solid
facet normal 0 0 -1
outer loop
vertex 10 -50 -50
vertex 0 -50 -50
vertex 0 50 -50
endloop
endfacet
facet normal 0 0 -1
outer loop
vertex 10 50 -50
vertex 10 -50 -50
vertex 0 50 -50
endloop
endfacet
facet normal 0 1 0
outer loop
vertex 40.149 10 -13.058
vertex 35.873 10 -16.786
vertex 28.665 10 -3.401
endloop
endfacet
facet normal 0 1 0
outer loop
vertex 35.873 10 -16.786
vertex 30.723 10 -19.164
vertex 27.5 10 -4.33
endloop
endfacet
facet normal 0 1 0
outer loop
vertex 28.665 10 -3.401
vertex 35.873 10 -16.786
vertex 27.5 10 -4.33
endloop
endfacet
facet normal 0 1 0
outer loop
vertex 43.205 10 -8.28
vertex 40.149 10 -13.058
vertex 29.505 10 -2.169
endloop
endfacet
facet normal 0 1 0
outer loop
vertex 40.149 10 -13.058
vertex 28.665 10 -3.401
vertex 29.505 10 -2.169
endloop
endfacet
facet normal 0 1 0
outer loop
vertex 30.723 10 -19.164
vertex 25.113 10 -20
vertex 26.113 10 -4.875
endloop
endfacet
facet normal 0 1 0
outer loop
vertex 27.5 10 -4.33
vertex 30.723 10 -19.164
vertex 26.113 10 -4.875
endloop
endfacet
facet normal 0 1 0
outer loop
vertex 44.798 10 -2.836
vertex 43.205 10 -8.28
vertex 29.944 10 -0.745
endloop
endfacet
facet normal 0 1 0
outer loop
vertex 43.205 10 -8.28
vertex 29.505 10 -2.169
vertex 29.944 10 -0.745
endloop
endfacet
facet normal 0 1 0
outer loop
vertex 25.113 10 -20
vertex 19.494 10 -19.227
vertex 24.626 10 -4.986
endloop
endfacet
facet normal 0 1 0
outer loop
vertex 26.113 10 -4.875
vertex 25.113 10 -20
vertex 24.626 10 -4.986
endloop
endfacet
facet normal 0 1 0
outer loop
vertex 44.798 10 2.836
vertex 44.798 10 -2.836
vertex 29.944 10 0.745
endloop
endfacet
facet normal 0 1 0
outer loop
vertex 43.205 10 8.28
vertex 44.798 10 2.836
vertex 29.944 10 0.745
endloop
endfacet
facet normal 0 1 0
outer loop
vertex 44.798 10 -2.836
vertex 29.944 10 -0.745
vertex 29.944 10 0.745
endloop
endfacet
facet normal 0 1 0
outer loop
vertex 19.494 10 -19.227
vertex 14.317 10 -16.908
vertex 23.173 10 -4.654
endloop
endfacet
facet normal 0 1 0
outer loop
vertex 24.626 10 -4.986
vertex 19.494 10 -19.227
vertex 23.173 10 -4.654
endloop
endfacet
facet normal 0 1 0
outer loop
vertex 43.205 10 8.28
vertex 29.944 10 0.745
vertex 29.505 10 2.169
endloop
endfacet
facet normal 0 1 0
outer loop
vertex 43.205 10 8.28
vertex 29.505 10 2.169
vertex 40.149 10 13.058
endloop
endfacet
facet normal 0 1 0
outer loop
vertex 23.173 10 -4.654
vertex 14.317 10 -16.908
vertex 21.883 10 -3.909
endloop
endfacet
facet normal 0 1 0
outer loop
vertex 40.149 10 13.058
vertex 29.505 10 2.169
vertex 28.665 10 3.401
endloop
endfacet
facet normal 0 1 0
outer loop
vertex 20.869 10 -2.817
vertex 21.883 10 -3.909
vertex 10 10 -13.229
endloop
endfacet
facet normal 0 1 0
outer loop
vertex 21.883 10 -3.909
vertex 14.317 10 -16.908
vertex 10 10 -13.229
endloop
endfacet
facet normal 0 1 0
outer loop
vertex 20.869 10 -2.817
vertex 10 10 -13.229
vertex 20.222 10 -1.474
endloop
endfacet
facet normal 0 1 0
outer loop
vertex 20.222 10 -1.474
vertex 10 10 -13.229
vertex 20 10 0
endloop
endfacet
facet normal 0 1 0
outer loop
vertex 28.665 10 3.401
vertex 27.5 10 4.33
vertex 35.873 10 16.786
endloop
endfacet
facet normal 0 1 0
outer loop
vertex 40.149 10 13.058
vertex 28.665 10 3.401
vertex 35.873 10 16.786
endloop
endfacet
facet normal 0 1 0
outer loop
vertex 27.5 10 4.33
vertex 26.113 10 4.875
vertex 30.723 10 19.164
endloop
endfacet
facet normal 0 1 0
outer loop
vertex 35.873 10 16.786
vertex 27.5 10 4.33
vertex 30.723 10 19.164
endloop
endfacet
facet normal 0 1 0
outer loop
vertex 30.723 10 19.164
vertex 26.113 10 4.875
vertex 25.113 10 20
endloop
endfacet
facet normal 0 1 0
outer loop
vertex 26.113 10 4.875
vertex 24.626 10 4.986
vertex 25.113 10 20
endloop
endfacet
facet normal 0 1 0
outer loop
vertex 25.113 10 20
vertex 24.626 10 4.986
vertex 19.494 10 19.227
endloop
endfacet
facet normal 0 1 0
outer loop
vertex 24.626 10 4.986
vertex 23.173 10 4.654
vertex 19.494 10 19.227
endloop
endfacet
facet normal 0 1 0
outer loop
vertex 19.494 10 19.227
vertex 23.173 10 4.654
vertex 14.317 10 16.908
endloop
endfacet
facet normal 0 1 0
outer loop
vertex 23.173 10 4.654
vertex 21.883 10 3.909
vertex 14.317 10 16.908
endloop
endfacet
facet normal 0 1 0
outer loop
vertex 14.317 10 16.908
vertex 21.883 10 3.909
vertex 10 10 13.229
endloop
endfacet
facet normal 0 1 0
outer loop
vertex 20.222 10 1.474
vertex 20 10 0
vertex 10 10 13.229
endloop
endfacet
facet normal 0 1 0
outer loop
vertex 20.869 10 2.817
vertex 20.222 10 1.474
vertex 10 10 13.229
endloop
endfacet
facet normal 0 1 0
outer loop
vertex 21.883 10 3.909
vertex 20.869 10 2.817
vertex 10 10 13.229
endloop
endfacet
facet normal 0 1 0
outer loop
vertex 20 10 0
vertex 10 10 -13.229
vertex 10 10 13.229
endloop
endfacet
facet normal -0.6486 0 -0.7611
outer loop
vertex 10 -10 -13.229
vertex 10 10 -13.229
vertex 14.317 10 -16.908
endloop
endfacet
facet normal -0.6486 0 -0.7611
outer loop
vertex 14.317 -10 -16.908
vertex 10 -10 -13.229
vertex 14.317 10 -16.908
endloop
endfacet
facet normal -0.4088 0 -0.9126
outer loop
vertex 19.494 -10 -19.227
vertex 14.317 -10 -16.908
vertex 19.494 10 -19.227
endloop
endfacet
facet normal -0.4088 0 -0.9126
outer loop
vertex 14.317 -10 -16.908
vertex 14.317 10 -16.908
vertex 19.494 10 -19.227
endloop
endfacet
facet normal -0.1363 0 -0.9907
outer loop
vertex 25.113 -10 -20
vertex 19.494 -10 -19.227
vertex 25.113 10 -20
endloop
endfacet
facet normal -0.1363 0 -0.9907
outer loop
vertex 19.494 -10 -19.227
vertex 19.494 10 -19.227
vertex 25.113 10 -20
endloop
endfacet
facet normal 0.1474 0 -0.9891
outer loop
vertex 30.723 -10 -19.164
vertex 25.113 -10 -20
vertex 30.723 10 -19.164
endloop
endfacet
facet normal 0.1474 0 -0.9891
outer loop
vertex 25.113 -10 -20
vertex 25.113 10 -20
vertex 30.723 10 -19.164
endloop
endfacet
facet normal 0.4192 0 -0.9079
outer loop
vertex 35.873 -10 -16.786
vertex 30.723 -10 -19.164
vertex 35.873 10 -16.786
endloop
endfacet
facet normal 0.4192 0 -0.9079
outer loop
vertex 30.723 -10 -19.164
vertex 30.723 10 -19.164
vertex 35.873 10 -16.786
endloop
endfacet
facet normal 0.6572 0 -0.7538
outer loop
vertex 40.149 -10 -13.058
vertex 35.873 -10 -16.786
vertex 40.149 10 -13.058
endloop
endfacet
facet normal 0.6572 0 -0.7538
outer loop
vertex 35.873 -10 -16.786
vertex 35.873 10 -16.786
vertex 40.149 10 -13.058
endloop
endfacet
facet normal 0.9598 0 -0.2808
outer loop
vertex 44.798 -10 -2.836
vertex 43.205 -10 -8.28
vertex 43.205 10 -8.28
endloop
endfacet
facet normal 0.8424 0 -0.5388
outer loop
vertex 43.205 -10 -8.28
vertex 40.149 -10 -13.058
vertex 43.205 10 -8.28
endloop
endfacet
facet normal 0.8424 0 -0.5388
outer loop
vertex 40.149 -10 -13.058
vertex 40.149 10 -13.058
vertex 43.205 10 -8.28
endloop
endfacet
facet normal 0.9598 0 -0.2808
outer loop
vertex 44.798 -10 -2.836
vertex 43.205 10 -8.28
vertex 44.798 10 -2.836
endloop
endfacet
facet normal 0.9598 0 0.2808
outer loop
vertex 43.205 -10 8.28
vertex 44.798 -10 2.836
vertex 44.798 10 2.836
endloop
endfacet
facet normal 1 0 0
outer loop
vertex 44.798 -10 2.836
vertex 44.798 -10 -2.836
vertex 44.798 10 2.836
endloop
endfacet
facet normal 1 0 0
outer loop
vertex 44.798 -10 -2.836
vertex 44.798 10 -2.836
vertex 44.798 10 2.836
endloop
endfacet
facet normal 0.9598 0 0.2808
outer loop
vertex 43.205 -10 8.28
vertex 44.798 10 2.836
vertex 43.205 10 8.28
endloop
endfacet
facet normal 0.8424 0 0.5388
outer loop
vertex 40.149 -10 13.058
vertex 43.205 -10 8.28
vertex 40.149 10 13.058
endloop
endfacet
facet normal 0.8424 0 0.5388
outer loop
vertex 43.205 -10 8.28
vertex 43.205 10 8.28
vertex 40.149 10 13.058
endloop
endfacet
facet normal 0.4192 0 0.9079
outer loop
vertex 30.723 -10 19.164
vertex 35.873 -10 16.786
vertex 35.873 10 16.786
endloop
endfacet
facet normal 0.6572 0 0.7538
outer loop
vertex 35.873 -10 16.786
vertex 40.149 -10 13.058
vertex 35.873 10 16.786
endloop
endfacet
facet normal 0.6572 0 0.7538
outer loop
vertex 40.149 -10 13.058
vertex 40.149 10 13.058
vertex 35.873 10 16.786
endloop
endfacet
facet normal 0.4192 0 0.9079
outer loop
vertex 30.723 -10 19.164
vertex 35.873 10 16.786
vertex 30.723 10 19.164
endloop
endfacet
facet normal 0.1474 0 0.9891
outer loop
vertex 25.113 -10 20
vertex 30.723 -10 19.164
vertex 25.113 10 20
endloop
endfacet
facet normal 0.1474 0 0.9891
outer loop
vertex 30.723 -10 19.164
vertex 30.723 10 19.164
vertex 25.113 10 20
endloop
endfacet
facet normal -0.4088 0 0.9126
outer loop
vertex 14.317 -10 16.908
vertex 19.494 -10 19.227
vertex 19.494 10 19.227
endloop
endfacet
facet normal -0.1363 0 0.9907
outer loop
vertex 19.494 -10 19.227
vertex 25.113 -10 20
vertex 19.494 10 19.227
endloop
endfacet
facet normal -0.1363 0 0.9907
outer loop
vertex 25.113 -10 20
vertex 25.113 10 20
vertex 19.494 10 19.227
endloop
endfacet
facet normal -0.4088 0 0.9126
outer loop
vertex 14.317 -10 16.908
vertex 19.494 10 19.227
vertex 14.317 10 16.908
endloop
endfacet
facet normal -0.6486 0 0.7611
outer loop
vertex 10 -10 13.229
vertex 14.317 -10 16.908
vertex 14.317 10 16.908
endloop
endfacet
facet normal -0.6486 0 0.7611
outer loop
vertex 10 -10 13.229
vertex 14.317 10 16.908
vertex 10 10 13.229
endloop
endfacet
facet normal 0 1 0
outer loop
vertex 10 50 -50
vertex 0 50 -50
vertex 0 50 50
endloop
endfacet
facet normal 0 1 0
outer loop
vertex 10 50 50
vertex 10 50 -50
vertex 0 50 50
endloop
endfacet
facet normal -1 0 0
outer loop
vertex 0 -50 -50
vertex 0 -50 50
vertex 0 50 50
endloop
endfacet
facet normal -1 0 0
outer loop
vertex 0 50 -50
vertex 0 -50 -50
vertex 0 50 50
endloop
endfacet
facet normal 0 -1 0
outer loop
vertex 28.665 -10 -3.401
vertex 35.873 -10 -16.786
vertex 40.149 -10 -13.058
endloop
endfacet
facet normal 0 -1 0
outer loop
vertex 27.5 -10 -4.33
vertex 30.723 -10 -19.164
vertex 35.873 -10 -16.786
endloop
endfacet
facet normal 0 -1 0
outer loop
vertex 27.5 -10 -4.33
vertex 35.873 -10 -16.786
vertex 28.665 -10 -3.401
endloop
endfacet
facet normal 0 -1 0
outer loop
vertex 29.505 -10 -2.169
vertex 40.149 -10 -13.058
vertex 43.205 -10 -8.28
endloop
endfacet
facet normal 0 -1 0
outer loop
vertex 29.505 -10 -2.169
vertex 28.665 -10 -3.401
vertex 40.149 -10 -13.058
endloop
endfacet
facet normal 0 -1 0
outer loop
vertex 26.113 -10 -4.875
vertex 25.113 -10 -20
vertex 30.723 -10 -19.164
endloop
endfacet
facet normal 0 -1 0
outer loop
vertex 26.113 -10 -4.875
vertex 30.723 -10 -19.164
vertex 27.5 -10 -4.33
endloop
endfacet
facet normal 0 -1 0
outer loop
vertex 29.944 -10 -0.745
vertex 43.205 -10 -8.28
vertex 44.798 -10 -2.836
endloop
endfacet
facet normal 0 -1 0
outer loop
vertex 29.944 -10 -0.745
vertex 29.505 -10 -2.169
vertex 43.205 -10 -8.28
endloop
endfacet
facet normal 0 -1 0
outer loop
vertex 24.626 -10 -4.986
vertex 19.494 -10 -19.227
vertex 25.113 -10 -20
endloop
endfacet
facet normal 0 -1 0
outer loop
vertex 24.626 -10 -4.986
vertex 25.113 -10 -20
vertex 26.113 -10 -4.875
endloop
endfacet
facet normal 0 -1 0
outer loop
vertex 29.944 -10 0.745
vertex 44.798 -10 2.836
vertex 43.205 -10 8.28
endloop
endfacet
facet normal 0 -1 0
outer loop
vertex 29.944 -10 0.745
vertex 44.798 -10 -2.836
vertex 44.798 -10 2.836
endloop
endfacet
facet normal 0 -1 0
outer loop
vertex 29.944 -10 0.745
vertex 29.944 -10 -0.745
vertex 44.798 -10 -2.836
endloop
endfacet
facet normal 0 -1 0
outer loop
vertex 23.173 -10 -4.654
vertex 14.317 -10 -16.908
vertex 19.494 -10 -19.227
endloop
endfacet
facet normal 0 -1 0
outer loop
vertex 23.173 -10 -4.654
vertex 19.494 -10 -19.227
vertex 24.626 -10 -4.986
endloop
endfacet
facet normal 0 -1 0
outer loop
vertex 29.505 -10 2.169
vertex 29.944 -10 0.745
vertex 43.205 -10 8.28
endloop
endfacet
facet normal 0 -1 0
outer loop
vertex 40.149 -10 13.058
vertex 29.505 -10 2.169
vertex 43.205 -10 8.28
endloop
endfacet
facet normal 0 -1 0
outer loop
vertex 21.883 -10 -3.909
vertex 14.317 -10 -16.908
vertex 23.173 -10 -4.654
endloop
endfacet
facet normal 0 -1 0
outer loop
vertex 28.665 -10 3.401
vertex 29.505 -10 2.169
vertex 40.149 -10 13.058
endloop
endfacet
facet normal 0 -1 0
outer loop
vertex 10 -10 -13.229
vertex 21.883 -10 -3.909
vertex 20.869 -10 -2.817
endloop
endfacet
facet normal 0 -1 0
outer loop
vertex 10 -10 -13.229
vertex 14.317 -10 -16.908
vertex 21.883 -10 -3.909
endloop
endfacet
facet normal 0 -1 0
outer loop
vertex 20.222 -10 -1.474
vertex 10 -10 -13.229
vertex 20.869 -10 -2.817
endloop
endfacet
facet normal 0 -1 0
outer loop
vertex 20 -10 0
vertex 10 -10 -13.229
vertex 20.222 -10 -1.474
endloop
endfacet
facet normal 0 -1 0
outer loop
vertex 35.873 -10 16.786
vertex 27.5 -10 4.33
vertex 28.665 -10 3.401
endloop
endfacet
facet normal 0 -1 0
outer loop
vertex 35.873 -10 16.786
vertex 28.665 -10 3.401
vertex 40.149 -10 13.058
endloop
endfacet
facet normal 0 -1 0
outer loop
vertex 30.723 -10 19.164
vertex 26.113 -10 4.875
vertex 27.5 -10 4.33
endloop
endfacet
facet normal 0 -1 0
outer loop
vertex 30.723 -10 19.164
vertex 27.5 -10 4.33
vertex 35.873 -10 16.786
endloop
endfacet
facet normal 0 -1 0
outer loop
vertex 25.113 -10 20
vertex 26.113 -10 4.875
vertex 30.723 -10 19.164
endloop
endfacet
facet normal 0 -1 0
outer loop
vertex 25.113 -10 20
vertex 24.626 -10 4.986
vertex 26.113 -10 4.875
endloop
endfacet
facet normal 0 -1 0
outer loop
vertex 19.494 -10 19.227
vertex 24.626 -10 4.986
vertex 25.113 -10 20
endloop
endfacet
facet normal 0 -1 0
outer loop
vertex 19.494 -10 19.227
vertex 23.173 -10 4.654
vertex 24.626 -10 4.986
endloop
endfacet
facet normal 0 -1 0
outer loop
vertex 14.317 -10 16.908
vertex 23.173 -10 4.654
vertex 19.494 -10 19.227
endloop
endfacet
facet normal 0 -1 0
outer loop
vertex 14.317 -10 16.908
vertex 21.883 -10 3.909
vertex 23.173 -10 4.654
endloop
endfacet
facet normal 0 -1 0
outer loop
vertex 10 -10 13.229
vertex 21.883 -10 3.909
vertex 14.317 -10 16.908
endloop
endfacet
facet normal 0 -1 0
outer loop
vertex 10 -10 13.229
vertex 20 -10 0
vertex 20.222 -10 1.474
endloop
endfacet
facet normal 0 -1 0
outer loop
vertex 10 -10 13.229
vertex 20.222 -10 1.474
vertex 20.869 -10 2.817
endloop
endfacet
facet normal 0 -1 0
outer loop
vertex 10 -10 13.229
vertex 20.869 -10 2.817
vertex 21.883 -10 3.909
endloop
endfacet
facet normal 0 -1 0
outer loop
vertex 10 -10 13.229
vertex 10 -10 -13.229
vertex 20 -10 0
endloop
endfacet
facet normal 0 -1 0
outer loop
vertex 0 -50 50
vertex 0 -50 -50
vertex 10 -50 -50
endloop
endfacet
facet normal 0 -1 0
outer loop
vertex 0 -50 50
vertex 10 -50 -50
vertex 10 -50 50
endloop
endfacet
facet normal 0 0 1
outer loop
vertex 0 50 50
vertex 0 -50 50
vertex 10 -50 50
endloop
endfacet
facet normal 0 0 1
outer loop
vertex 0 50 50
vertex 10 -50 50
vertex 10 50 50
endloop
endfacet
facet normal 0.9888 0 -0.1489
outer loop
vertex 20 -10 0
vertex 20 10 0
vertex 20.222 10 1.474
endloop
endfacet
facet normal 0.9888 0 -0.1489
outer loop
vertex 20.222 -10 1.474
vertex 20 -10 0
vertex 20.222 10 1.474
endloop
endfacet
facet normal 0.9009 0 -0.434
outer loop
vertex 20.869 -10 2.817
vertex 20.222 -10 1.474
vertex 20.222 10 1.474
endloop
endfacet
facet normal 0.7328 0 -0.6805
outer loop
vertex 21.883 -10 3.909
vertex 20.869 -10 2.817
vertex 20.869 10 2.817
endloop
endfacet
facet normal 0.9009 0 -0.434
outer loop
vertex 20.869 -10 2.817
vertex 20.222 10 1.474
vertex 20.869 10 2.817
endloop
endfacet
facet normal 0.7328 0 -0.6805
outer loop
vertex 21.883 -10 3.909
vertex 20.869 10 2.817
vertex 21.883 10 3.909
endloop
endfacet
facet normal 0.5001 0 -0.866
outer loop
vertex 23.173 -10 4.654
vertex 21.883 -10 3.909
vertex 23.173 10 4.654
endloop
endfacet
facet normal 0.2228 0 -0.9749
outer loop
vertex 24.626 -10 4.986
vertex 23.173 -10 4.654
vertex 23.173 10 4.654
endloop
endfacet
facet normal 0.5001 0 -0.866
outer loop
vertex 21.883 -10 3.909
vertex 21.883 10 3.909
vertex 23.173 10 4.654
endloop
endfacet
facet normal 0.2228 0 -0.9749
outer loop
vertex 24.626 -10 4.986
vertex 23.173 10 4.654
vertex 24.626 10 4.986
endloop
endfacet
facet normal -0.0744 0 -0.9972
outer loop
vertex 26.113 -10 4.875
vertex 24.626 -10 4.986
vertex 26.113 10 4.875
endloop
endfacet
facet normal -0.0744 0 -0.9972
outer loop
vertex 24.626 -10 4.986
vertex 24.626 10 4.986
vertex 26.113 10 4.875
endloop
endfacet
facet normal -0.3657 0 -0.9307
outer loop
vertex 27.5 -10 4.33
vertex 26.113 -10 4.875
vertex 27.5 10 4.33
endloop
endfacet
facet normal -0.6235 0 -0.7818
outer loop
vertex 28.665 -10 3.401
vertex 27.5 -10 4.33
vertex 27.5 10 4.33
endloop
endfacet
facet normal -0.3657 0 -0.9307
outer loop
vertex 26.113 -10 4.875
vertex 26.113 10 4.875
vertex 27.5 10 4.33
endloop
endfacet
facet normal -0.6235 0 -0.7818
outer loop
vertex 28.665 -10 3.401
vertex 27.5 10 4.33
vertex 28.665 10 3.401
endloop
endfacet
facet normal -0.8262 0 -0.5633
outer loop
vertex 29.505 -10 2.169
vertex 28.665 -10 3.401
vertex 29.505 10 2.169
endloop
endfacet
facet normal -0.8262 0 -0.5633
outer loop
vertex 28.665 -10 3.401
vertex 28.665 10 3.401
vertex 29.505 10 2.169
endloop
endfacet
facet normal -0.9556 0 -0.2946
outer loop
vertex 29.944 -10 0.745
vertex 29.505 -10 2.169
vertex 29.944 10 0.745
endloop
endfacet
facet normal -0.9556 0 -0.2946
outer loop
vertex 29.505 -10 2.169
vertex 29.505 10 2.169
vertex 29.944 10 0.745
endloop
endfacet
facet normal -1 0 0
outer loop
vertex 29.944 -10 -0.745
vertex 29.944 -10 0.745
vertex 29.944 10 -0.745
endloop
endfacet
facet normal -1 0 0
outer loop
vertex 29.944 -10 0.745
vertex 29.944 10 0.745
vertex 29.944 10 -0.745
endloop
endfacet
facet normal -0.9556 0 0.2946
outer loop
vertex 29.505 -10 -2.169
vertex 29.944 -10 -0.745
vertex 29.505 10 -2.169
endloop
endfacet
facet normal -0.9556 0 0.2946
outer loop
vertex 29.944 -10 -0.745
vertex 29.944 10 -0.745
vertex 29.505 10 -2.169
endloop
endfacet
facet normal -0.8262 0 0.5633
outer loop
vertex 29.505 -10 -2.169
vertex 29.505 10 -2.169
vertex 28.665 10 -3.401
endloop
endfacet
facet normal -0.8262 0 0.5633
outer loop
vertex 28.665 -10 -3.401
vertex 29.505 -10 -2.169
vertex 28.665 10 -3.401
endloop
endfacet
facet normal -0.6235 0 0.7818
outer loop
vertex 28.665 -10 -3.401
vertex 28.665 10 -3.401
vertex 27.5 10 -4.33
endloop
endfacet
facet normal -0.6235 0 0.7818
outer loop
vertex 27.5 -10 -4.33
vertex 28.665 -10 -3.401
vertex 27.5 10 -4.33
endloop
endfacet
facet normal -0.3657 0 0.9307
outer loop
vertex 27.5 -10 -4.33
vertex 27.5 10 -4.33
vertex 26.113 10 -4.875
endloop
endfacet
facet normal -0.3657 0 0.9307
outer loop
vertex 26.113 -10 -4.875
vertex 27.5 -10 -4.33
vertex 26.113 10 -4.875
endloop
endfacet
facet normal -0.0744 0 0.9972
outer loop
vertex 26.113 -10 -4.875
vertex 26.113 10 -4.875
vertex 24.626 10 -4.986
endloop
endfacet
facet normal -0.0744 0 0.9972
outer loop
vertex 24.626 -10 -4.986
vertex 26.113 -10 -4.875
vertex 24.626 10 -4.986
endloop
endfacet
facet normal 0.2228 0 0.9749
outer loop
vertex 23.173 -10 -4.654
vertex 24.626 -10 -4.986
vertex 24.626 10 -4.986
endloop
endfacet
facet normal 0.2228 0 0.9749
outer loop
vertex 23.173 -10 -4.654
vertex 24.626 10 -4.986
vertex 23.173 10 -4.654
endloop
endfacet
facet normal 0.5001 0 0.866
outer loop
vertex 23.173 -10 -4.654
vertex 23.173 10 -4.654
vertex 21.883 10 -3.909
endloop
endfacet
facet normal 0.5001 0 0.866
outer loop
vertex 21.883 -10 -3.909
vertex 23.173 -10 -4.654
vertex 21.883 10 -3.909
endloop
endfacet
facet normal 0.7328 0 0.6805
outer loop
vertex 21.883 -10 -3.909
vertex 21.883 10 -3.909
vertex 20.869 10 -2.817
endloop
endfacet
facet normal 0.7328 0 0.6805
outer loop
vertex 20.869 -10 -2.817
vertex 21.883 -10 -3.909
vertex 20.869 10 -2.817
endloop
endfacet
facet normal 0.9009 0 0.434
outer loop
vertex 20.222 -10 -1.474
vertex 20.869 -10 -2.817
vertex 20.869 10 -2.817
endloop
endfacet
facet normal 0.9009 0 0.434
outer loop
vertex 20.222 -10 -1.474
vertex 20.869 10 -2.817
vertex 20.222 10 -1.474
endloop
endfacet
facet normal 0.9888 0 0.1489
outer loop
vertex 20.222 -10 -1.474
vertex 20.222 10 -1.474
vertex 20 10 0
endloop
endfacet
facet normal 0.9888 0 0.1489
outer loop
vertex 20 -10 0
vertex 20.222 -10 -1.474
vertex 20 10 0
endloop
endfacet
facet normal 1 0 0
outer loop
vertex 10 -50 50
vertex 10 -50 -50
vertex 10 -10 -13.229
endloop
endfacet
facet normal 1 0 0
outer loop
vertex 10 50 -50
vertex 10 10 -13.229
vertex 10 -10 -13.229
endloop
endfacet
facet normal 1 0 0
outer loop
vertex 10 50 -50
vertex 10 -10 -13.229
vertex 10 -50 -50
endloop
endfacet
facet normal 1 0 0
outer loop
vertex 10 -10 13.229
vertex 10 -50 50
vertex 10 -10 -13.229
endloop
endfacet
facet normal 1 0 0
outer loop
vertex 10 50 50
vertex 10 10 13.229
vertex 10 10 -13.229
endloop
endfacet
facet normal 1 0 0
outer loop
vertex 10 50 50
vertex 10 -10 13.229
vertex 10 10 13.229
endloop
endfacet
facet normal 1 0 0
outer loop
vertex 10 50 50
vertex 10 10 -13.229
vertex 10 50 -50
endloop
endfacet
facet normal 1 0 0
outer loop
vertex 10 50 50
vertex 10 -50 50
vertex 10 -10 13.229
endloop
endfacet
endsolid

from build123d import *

# Parameters (mm, degrees)
F0_W     = 100
F0_H     = 100
F1_DEPTH = 10
F2_W     = 20
F2_H     = 70
F3_DEPTH = 70
F5_DEPTH = 60.001
F4_R     = 5
F6_DEPTH = 60.001


with BuildPart() as f1:
    # F0 (on Right) → F1 (new body)
    with BuildSketch(Plane.YZ):
        Rectangle(F0_W, F0_H)
    extrude(amount=F1_DEPTH)

    # F2 (on face) → F3 (join)
    with BuildSketch(Plane.YZ.offset(10)):
        Rectangle(F2_W, F2_H)
    extrude(amount=F3_DEPTH)

    # F4 (on face) → F5 (cut, through all)
    with BuildSketch(Plane(origin=(0, 10, 0), x_dir=(-1, 0, 0), z_dir=(0, 1, 0))):
        with BuildLine():
            ThreePointArc((-10, -13.228757), (-45, 0), (-10, 13.228757))
            Line((-10, 13.228757), (-10, 35))
            Line((-10, 35), (-80, 35))
            Line((-80, 35), (-80, -35))
            Line((-80, -35), (-10, -35))
            Line((-10, -35), (-10, -13.228757))
        make_face()
    extrude(amount=-F5_DEPTH, mode=Mode.SUBTRACT)

    # F4 (on face) → F6 (cut, through all)
    with BuildSketch(Plane(origin=(0, 10, 0), x_dir=(-1, 0, 0), z_dir=(0, 1, 0))):
        with Locations((-25, 0)):
            Circle(F4_R)
    extrude(amount=-F6_DEPTH, mode=Mode.SUBTRACT)


solid = f1.part
